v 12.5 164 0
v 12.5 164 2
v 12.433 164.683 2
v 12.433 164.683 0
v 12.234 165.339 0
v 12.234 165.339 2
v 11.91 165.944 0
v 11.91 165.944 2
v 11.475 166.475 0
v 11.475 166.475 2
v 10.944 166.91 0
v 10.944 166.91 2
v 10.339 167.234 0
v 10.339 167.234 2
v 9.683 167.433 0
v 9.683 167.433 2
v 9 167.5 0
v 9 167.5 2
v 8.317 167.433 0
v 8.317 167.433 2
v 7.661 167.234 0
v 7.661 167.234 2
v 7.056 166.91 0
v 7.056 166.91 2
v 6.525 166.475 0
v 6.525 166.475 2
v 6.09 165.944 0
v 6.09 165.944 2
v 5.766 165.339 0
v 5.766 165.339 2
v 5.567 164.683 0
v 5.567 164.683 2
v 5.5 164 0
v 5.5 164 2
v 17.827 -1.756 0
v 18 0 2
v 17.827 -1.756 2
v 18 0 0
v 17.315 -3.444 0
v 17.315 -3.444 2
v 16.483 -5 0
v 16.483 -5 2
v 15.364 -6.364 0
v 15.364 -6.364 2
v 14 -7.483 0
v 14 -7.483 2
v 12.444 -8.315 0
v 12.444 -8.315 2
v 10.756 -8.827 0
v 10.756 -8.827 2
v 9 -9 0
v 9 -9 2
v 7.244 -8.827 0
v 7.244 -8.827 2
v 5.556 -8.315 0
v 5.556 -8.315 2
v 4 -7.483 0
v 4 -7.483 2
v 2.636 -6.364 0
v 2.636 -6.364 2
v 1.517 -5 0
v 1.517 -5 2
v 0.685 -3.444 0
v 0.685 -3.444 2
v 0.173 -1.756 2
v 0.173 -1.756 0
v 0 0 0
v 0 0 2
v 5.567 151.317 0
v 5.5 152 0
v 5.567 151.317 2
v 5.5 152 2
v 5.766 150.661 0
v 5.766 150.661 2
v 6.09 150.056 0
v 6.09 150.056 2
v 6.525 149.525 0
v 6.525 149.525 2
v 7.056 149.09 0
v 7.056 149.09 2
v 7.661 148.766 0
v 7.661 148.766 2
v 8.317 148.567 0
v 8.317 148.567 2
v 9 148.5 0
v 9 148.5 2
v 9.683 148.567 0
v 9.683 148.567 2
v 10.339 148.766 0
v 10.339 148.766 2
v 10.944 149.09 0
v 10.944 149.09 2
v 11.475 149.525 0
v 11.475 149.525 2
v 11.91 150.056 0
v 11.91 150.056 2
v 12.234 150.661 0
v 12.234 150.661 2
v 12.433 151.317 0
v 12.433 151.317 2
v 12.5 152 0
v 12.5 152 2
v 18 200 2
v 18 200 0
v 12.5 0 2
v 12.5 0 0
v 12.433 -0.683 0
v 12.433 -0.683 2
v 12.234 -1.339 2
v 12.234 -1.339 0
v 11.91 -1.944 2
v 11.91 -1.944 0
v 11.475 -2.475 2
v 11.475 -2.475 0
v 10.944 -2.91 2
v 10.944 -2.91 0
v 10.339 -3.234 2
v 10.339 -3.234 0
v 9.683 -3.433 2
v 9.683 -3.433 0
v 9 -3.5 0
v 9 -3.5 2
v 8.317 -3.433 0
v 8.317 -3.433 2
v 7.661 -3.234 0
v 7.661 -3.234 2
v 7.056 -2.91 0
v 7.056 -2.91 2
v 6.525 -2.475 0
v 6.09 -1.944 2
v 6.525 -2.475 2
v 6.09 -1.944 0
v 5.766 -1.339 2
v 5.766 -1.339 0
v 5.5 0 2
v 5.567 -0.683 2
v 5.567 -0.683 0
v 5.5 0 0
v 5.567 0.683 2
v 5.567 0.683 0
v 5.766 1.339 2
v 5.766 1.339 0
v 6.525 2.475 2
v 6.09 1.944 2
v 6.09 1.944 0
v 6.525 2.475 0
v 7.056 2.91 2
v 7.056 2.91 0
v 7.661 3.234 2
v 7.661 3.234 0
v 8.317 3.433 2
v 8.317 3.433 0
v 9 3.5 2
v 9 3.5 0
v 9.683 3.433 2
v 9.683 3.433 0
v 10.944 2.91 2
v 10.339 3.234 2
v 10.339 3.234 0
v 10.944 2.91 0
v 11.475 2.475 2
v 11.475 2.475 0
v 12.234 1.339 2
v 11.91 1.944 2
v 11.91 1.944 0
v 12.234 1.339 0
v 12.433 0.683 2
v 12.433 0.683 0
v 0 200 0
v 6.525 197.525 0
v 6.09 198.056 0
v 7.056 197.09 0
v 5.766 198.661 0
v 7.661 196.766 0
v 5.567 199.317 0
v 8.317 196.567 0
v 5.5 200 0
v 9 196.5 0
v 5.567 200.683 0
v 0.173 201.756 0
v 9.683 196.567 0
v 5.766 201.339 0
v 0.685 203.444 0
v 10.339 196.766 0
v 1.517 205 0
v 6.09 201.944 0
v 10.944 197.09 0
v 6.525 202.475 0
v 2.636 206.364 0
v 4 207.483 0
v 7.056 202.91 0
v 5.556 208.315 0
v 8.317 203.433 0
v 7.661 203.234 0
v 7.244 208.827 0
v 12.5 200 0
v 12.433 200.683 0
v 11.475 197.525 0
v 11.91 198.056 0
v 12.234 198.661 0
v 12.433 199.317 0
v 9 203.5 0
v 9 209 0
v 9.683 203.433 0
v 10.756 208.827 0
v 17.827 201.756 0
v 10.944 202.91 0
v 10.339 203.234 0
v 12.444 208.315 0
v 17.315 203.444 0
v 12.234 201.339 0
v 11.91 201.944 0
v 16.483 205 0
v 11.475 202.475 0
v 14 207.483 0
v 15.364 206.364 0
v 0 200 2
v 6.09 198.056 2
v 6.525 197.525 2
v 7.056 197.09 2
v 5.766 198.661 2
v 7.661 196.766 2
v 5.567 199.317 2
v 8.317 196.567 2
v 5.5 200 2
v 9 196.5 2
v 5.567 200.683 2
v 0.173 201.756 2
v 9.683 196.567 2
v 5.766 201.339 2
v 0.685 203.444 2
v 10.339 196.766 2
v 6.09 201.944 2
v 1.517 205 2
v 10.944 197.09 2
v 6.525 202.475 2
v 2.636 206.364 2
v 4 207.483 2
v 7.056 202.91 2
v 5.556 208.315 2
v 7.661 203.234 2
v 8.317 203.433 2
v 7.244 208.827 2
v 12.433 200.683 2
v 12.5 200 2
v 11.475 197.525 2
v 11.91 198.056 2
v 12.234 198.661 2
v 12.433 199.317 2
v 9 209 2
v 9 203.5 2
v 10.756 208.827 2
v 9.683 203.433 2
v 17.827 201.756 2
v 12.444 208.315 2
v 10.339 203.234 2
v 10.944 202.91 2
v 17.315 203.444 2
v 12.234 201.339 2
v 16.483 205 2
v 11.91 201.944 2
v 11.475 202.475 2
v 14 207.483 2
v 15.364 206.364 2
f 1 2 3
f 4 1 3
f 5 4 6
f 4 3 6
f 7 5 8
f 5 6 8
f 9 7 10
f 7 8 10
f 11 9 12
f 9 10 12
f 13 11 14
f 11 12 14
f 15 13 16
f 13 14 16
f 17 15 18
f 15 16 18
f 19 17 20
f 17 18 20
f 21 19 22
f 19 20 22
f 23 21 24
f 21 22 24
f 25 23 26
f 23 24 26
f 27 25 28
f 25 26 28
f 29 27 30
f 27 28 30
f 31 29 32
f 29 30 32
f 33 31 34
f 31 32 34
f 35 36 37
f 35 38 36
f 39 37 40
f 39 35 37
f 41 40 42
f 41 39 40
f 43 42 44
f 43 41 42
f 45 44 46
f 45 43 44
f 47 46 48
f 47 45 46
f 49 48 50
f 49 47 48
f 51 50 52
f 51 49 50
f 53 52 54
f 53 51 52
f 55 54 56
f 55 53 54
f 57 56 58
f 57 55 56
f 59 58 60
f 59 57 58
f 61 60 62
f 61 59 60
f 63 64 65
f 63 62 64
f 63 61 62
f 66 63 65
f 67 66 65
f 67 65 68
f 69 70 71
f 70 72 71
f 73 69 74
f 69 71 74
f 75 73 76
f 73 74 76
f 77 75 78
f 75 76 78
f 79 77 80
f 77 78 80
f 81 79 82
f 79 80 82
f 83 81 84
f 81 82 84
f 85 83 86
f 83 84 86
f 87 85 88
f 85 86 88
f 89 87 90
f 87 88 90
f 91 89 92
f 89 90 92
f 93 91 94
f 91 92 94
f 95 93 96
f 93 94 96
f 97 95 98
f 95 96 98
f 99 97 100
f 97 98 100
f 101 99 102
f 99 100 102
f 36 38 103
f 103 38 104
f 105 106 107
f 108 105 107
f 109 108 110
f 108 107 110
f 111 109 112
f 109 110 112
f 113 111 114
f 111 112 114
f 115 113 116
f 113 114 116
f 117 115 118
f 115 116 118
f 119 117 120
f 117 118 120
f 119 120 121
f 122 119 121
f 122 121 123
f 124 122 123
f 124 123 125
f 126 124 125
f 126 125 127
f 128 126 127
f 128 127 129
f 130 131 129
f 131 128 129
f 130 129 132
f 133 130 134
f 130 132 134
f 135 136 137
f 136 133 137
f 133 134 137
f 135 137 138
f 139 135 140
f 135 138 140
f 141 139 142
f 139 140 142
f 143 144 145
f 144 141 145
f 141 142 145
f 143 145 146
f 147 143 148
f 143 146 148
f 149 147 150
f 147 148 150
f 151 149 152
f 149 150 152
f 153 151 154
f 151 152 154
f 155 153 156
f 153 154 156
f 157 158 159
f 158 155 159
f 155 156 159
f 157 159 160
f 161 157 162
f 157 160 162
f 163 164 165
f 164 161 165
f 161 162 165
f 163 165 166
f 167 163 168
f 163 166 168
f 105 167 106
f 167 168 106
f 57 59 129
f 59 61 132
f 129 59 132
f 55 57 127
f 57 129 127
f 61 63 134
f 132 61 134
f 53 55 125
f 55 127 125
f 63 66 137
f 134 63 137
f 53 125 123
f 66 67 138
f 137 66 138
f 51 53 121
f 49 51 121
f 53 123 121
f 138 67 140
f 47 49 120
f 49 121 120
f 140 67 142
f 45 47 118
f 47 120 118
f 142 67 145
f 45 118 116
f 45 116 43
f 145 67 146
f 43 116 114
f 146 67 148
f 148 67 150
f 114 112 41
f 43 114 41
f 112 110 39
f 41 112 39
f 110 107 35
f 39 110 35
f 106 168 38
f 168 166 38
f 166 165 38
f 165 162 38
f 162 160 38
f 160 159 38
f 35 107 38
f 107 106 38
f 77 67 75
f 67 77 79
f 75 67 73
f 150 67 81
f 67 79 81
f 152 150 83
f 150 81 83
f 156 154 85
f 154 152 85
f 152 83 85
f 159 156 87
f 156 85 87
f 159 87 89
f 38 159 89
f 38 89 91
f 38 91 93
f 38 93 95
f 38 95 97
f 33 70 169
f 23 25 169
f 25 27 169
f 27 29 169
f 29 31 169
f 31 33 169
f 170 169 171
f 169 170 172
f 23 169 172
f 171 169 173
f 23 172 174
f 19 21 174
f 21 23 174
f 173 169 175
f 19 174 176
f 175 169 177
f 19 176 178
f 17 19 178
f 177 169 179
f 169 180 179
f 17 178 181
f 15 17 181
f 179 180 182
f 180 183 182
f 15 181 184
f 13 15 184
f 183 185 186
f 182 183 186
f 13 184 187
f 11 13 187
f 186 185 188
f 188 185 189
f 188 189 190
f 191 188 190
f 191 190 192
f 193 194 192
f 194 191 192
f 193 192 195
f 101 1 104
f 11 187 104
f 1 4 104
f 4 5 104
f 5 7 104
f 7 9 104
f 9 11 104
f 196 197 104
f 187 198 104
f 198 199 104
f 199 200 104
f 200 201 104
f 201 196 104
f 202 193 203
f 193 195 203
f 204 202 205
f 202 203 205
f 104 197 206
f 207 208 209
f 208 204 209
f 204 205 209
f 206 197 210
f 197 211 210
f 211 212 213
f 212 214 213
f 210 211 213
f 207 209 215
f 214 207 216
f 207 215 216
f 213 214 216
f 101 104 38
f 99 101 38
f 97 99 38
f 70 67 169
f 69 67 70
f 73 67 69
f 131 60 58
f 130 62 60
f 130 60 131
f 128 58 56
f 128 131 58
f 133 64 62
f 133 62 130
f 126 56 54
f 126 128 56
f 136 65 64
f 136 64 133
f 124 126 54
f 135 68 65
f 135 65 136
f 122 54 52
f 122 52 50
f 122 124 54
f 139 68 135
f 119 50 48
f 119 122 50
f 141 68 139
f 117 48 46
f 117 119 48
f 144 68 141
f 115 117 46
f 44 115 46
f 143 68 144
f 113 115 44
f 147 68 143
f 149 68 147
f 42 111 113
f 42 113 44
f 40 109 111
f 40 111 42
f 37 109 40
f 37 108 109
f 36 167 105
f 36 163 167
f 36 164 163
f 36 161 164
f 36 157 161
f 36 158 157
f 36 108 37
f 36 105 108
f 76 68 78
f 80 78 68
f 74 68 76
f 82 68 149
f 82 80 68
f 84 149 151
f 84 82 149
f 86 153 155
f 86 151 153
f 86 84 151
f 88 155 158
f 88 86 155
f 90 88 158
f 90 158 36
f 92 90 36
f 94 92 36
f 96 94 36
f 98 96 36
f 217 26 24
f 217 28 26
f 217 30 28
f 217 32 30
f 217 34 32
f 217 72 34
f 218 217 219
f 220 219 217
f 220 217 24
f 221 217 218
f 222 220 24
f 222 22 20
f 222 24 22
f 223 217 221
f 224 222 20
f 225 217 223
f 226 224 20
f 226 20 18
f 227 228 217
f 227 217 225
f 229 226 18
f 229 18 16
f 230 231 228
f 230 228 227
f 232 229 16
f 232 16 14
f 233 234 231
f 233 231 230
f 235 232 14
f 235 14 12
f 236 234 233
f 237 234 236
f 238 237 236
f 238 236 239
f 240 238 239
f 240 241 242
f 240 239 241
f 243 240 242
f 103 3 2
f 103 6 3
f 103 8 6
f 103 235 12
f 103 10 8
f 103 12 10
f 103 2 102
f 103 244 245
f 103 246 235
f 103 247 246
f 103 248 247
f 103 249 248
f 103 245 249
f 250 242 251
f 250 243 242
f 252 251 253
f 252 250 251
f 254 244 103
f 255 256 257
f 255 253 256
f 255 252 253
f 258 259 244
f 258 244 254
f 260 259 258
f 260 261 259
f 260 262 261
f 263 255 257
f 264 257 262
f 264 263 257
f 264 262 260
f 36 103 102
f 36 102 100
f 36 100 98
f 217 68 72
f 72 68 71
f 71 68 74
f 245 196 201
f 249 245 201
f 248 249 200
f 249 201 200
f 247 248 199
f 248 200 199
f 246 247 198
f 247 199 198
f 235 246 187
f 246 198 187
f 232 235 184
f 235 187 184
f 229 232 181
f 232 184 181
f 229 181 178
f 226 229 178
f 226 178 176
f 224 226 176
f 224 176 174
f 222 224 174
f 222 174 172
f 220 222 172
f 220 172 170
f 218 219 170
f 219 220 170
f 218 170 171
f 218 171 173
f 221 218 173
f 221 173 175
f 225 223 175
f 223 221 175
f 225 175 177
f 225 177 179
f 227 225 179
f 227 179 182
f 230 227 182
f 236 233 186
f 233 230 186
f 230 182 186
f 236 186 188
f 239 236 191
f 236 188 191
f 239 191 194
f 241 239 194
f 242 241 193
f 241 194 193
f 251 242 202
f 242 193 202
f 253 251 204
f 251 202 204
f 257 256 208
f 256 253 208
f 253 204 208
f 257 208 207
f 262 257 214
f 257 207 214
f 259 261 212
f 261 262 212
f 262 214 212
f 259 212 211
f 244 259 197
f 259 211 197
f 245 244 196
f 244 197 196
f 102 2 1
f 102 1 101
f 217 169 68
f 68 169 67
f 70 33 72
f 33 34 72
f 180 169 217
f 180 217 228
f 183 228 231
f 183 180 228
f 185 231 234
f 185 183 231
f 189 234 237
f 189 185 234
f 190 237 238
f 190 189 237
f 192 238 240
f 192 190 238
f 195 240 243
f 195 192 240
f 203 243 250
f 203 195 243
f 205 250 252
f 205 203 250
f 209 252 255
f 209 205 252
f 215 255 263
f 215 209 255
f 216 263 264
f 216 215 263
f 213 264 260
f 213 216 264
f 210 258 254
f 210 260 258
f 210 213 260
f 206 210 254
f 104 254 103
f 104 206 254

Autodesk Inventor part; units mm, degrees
ref_plane "YZ Plane" through (0, 0, 0) normal (1, 0, 0) x (0, 1, 0)
ref_plane "XZ Plane" through (0, 0, 0) normal (0, 1, 0) x (-1, 0, 0)
ref_plane "XY Plane" through (0, 0, 0) normal (0, 0, 1) x (1, 0, 0)
sketch "スケッチ1" plane through (0, 0, 0) normal (0, 0, 1) x (1, 0, 0)
  line L0 (18, 0) -> (18, 200)
  line L1 (0, 200) -> (0, 0)
  line L2 (9, 200) -> (9, 0) construction
  arc A0 (18, 200) -> (0, 200) centre (9, 200) ccw
  arc A1 (0, 0) -> (18, 0) centre (9, 0) ccw
  circle A2 centre (9, 0) radius 3.5
  circle A3 centre (9, 200) radius 3.5
  dimension "d35" = 18
  dimension "d36" = 200
  dimension "d37" = 7
  dimension "d38" = 7
extrude "押し出し1" add sketch "スケッチ1" along normal blind 2
sketch "スケッチ3" plane through (0, 0, 2) normal (0, 0, 1) x (1, 0, 0)
  circle A0 centre (9, 0) radius 3.5 projected
  circle A1 centre (9, 200) radius 3.5 projected
  arc A2 (18, 200) -> (0, 200) centre (9, 200) ccw projected
  line L0 (0, 200) -> (0, 0) projected
  arc A3 (0, 0) -> (18, 0) centre (9, 0) ccw projected
  line L1 (18, 0) -> (18, 200) projected
  circle A4 centre (9, 0) radius 3.5 projected
  line L2 (9, 200) -> (9, 0) construction
  arc A5 (5.5, 152) -> (12.5, 152) centre (9, 152) ccw
  arc A6 (12.5, 164) -> (5.5, 164) centre (9, 164) ccw
  line L3 (5.5, 164) -> (5.5, 152)
  line L4 (12.5, 164) -> (12.5, 152)
  dimension "d41" = 7
  dimension "d42" = 48
  dimension "d43" = 7
  dimension "d44" = 36
extrude "押し出し2" cut sketch "スケッチ3" against normal through all contours L3 A6 L4 A5
properties part number "foot_link_lever" material "GFRP"
